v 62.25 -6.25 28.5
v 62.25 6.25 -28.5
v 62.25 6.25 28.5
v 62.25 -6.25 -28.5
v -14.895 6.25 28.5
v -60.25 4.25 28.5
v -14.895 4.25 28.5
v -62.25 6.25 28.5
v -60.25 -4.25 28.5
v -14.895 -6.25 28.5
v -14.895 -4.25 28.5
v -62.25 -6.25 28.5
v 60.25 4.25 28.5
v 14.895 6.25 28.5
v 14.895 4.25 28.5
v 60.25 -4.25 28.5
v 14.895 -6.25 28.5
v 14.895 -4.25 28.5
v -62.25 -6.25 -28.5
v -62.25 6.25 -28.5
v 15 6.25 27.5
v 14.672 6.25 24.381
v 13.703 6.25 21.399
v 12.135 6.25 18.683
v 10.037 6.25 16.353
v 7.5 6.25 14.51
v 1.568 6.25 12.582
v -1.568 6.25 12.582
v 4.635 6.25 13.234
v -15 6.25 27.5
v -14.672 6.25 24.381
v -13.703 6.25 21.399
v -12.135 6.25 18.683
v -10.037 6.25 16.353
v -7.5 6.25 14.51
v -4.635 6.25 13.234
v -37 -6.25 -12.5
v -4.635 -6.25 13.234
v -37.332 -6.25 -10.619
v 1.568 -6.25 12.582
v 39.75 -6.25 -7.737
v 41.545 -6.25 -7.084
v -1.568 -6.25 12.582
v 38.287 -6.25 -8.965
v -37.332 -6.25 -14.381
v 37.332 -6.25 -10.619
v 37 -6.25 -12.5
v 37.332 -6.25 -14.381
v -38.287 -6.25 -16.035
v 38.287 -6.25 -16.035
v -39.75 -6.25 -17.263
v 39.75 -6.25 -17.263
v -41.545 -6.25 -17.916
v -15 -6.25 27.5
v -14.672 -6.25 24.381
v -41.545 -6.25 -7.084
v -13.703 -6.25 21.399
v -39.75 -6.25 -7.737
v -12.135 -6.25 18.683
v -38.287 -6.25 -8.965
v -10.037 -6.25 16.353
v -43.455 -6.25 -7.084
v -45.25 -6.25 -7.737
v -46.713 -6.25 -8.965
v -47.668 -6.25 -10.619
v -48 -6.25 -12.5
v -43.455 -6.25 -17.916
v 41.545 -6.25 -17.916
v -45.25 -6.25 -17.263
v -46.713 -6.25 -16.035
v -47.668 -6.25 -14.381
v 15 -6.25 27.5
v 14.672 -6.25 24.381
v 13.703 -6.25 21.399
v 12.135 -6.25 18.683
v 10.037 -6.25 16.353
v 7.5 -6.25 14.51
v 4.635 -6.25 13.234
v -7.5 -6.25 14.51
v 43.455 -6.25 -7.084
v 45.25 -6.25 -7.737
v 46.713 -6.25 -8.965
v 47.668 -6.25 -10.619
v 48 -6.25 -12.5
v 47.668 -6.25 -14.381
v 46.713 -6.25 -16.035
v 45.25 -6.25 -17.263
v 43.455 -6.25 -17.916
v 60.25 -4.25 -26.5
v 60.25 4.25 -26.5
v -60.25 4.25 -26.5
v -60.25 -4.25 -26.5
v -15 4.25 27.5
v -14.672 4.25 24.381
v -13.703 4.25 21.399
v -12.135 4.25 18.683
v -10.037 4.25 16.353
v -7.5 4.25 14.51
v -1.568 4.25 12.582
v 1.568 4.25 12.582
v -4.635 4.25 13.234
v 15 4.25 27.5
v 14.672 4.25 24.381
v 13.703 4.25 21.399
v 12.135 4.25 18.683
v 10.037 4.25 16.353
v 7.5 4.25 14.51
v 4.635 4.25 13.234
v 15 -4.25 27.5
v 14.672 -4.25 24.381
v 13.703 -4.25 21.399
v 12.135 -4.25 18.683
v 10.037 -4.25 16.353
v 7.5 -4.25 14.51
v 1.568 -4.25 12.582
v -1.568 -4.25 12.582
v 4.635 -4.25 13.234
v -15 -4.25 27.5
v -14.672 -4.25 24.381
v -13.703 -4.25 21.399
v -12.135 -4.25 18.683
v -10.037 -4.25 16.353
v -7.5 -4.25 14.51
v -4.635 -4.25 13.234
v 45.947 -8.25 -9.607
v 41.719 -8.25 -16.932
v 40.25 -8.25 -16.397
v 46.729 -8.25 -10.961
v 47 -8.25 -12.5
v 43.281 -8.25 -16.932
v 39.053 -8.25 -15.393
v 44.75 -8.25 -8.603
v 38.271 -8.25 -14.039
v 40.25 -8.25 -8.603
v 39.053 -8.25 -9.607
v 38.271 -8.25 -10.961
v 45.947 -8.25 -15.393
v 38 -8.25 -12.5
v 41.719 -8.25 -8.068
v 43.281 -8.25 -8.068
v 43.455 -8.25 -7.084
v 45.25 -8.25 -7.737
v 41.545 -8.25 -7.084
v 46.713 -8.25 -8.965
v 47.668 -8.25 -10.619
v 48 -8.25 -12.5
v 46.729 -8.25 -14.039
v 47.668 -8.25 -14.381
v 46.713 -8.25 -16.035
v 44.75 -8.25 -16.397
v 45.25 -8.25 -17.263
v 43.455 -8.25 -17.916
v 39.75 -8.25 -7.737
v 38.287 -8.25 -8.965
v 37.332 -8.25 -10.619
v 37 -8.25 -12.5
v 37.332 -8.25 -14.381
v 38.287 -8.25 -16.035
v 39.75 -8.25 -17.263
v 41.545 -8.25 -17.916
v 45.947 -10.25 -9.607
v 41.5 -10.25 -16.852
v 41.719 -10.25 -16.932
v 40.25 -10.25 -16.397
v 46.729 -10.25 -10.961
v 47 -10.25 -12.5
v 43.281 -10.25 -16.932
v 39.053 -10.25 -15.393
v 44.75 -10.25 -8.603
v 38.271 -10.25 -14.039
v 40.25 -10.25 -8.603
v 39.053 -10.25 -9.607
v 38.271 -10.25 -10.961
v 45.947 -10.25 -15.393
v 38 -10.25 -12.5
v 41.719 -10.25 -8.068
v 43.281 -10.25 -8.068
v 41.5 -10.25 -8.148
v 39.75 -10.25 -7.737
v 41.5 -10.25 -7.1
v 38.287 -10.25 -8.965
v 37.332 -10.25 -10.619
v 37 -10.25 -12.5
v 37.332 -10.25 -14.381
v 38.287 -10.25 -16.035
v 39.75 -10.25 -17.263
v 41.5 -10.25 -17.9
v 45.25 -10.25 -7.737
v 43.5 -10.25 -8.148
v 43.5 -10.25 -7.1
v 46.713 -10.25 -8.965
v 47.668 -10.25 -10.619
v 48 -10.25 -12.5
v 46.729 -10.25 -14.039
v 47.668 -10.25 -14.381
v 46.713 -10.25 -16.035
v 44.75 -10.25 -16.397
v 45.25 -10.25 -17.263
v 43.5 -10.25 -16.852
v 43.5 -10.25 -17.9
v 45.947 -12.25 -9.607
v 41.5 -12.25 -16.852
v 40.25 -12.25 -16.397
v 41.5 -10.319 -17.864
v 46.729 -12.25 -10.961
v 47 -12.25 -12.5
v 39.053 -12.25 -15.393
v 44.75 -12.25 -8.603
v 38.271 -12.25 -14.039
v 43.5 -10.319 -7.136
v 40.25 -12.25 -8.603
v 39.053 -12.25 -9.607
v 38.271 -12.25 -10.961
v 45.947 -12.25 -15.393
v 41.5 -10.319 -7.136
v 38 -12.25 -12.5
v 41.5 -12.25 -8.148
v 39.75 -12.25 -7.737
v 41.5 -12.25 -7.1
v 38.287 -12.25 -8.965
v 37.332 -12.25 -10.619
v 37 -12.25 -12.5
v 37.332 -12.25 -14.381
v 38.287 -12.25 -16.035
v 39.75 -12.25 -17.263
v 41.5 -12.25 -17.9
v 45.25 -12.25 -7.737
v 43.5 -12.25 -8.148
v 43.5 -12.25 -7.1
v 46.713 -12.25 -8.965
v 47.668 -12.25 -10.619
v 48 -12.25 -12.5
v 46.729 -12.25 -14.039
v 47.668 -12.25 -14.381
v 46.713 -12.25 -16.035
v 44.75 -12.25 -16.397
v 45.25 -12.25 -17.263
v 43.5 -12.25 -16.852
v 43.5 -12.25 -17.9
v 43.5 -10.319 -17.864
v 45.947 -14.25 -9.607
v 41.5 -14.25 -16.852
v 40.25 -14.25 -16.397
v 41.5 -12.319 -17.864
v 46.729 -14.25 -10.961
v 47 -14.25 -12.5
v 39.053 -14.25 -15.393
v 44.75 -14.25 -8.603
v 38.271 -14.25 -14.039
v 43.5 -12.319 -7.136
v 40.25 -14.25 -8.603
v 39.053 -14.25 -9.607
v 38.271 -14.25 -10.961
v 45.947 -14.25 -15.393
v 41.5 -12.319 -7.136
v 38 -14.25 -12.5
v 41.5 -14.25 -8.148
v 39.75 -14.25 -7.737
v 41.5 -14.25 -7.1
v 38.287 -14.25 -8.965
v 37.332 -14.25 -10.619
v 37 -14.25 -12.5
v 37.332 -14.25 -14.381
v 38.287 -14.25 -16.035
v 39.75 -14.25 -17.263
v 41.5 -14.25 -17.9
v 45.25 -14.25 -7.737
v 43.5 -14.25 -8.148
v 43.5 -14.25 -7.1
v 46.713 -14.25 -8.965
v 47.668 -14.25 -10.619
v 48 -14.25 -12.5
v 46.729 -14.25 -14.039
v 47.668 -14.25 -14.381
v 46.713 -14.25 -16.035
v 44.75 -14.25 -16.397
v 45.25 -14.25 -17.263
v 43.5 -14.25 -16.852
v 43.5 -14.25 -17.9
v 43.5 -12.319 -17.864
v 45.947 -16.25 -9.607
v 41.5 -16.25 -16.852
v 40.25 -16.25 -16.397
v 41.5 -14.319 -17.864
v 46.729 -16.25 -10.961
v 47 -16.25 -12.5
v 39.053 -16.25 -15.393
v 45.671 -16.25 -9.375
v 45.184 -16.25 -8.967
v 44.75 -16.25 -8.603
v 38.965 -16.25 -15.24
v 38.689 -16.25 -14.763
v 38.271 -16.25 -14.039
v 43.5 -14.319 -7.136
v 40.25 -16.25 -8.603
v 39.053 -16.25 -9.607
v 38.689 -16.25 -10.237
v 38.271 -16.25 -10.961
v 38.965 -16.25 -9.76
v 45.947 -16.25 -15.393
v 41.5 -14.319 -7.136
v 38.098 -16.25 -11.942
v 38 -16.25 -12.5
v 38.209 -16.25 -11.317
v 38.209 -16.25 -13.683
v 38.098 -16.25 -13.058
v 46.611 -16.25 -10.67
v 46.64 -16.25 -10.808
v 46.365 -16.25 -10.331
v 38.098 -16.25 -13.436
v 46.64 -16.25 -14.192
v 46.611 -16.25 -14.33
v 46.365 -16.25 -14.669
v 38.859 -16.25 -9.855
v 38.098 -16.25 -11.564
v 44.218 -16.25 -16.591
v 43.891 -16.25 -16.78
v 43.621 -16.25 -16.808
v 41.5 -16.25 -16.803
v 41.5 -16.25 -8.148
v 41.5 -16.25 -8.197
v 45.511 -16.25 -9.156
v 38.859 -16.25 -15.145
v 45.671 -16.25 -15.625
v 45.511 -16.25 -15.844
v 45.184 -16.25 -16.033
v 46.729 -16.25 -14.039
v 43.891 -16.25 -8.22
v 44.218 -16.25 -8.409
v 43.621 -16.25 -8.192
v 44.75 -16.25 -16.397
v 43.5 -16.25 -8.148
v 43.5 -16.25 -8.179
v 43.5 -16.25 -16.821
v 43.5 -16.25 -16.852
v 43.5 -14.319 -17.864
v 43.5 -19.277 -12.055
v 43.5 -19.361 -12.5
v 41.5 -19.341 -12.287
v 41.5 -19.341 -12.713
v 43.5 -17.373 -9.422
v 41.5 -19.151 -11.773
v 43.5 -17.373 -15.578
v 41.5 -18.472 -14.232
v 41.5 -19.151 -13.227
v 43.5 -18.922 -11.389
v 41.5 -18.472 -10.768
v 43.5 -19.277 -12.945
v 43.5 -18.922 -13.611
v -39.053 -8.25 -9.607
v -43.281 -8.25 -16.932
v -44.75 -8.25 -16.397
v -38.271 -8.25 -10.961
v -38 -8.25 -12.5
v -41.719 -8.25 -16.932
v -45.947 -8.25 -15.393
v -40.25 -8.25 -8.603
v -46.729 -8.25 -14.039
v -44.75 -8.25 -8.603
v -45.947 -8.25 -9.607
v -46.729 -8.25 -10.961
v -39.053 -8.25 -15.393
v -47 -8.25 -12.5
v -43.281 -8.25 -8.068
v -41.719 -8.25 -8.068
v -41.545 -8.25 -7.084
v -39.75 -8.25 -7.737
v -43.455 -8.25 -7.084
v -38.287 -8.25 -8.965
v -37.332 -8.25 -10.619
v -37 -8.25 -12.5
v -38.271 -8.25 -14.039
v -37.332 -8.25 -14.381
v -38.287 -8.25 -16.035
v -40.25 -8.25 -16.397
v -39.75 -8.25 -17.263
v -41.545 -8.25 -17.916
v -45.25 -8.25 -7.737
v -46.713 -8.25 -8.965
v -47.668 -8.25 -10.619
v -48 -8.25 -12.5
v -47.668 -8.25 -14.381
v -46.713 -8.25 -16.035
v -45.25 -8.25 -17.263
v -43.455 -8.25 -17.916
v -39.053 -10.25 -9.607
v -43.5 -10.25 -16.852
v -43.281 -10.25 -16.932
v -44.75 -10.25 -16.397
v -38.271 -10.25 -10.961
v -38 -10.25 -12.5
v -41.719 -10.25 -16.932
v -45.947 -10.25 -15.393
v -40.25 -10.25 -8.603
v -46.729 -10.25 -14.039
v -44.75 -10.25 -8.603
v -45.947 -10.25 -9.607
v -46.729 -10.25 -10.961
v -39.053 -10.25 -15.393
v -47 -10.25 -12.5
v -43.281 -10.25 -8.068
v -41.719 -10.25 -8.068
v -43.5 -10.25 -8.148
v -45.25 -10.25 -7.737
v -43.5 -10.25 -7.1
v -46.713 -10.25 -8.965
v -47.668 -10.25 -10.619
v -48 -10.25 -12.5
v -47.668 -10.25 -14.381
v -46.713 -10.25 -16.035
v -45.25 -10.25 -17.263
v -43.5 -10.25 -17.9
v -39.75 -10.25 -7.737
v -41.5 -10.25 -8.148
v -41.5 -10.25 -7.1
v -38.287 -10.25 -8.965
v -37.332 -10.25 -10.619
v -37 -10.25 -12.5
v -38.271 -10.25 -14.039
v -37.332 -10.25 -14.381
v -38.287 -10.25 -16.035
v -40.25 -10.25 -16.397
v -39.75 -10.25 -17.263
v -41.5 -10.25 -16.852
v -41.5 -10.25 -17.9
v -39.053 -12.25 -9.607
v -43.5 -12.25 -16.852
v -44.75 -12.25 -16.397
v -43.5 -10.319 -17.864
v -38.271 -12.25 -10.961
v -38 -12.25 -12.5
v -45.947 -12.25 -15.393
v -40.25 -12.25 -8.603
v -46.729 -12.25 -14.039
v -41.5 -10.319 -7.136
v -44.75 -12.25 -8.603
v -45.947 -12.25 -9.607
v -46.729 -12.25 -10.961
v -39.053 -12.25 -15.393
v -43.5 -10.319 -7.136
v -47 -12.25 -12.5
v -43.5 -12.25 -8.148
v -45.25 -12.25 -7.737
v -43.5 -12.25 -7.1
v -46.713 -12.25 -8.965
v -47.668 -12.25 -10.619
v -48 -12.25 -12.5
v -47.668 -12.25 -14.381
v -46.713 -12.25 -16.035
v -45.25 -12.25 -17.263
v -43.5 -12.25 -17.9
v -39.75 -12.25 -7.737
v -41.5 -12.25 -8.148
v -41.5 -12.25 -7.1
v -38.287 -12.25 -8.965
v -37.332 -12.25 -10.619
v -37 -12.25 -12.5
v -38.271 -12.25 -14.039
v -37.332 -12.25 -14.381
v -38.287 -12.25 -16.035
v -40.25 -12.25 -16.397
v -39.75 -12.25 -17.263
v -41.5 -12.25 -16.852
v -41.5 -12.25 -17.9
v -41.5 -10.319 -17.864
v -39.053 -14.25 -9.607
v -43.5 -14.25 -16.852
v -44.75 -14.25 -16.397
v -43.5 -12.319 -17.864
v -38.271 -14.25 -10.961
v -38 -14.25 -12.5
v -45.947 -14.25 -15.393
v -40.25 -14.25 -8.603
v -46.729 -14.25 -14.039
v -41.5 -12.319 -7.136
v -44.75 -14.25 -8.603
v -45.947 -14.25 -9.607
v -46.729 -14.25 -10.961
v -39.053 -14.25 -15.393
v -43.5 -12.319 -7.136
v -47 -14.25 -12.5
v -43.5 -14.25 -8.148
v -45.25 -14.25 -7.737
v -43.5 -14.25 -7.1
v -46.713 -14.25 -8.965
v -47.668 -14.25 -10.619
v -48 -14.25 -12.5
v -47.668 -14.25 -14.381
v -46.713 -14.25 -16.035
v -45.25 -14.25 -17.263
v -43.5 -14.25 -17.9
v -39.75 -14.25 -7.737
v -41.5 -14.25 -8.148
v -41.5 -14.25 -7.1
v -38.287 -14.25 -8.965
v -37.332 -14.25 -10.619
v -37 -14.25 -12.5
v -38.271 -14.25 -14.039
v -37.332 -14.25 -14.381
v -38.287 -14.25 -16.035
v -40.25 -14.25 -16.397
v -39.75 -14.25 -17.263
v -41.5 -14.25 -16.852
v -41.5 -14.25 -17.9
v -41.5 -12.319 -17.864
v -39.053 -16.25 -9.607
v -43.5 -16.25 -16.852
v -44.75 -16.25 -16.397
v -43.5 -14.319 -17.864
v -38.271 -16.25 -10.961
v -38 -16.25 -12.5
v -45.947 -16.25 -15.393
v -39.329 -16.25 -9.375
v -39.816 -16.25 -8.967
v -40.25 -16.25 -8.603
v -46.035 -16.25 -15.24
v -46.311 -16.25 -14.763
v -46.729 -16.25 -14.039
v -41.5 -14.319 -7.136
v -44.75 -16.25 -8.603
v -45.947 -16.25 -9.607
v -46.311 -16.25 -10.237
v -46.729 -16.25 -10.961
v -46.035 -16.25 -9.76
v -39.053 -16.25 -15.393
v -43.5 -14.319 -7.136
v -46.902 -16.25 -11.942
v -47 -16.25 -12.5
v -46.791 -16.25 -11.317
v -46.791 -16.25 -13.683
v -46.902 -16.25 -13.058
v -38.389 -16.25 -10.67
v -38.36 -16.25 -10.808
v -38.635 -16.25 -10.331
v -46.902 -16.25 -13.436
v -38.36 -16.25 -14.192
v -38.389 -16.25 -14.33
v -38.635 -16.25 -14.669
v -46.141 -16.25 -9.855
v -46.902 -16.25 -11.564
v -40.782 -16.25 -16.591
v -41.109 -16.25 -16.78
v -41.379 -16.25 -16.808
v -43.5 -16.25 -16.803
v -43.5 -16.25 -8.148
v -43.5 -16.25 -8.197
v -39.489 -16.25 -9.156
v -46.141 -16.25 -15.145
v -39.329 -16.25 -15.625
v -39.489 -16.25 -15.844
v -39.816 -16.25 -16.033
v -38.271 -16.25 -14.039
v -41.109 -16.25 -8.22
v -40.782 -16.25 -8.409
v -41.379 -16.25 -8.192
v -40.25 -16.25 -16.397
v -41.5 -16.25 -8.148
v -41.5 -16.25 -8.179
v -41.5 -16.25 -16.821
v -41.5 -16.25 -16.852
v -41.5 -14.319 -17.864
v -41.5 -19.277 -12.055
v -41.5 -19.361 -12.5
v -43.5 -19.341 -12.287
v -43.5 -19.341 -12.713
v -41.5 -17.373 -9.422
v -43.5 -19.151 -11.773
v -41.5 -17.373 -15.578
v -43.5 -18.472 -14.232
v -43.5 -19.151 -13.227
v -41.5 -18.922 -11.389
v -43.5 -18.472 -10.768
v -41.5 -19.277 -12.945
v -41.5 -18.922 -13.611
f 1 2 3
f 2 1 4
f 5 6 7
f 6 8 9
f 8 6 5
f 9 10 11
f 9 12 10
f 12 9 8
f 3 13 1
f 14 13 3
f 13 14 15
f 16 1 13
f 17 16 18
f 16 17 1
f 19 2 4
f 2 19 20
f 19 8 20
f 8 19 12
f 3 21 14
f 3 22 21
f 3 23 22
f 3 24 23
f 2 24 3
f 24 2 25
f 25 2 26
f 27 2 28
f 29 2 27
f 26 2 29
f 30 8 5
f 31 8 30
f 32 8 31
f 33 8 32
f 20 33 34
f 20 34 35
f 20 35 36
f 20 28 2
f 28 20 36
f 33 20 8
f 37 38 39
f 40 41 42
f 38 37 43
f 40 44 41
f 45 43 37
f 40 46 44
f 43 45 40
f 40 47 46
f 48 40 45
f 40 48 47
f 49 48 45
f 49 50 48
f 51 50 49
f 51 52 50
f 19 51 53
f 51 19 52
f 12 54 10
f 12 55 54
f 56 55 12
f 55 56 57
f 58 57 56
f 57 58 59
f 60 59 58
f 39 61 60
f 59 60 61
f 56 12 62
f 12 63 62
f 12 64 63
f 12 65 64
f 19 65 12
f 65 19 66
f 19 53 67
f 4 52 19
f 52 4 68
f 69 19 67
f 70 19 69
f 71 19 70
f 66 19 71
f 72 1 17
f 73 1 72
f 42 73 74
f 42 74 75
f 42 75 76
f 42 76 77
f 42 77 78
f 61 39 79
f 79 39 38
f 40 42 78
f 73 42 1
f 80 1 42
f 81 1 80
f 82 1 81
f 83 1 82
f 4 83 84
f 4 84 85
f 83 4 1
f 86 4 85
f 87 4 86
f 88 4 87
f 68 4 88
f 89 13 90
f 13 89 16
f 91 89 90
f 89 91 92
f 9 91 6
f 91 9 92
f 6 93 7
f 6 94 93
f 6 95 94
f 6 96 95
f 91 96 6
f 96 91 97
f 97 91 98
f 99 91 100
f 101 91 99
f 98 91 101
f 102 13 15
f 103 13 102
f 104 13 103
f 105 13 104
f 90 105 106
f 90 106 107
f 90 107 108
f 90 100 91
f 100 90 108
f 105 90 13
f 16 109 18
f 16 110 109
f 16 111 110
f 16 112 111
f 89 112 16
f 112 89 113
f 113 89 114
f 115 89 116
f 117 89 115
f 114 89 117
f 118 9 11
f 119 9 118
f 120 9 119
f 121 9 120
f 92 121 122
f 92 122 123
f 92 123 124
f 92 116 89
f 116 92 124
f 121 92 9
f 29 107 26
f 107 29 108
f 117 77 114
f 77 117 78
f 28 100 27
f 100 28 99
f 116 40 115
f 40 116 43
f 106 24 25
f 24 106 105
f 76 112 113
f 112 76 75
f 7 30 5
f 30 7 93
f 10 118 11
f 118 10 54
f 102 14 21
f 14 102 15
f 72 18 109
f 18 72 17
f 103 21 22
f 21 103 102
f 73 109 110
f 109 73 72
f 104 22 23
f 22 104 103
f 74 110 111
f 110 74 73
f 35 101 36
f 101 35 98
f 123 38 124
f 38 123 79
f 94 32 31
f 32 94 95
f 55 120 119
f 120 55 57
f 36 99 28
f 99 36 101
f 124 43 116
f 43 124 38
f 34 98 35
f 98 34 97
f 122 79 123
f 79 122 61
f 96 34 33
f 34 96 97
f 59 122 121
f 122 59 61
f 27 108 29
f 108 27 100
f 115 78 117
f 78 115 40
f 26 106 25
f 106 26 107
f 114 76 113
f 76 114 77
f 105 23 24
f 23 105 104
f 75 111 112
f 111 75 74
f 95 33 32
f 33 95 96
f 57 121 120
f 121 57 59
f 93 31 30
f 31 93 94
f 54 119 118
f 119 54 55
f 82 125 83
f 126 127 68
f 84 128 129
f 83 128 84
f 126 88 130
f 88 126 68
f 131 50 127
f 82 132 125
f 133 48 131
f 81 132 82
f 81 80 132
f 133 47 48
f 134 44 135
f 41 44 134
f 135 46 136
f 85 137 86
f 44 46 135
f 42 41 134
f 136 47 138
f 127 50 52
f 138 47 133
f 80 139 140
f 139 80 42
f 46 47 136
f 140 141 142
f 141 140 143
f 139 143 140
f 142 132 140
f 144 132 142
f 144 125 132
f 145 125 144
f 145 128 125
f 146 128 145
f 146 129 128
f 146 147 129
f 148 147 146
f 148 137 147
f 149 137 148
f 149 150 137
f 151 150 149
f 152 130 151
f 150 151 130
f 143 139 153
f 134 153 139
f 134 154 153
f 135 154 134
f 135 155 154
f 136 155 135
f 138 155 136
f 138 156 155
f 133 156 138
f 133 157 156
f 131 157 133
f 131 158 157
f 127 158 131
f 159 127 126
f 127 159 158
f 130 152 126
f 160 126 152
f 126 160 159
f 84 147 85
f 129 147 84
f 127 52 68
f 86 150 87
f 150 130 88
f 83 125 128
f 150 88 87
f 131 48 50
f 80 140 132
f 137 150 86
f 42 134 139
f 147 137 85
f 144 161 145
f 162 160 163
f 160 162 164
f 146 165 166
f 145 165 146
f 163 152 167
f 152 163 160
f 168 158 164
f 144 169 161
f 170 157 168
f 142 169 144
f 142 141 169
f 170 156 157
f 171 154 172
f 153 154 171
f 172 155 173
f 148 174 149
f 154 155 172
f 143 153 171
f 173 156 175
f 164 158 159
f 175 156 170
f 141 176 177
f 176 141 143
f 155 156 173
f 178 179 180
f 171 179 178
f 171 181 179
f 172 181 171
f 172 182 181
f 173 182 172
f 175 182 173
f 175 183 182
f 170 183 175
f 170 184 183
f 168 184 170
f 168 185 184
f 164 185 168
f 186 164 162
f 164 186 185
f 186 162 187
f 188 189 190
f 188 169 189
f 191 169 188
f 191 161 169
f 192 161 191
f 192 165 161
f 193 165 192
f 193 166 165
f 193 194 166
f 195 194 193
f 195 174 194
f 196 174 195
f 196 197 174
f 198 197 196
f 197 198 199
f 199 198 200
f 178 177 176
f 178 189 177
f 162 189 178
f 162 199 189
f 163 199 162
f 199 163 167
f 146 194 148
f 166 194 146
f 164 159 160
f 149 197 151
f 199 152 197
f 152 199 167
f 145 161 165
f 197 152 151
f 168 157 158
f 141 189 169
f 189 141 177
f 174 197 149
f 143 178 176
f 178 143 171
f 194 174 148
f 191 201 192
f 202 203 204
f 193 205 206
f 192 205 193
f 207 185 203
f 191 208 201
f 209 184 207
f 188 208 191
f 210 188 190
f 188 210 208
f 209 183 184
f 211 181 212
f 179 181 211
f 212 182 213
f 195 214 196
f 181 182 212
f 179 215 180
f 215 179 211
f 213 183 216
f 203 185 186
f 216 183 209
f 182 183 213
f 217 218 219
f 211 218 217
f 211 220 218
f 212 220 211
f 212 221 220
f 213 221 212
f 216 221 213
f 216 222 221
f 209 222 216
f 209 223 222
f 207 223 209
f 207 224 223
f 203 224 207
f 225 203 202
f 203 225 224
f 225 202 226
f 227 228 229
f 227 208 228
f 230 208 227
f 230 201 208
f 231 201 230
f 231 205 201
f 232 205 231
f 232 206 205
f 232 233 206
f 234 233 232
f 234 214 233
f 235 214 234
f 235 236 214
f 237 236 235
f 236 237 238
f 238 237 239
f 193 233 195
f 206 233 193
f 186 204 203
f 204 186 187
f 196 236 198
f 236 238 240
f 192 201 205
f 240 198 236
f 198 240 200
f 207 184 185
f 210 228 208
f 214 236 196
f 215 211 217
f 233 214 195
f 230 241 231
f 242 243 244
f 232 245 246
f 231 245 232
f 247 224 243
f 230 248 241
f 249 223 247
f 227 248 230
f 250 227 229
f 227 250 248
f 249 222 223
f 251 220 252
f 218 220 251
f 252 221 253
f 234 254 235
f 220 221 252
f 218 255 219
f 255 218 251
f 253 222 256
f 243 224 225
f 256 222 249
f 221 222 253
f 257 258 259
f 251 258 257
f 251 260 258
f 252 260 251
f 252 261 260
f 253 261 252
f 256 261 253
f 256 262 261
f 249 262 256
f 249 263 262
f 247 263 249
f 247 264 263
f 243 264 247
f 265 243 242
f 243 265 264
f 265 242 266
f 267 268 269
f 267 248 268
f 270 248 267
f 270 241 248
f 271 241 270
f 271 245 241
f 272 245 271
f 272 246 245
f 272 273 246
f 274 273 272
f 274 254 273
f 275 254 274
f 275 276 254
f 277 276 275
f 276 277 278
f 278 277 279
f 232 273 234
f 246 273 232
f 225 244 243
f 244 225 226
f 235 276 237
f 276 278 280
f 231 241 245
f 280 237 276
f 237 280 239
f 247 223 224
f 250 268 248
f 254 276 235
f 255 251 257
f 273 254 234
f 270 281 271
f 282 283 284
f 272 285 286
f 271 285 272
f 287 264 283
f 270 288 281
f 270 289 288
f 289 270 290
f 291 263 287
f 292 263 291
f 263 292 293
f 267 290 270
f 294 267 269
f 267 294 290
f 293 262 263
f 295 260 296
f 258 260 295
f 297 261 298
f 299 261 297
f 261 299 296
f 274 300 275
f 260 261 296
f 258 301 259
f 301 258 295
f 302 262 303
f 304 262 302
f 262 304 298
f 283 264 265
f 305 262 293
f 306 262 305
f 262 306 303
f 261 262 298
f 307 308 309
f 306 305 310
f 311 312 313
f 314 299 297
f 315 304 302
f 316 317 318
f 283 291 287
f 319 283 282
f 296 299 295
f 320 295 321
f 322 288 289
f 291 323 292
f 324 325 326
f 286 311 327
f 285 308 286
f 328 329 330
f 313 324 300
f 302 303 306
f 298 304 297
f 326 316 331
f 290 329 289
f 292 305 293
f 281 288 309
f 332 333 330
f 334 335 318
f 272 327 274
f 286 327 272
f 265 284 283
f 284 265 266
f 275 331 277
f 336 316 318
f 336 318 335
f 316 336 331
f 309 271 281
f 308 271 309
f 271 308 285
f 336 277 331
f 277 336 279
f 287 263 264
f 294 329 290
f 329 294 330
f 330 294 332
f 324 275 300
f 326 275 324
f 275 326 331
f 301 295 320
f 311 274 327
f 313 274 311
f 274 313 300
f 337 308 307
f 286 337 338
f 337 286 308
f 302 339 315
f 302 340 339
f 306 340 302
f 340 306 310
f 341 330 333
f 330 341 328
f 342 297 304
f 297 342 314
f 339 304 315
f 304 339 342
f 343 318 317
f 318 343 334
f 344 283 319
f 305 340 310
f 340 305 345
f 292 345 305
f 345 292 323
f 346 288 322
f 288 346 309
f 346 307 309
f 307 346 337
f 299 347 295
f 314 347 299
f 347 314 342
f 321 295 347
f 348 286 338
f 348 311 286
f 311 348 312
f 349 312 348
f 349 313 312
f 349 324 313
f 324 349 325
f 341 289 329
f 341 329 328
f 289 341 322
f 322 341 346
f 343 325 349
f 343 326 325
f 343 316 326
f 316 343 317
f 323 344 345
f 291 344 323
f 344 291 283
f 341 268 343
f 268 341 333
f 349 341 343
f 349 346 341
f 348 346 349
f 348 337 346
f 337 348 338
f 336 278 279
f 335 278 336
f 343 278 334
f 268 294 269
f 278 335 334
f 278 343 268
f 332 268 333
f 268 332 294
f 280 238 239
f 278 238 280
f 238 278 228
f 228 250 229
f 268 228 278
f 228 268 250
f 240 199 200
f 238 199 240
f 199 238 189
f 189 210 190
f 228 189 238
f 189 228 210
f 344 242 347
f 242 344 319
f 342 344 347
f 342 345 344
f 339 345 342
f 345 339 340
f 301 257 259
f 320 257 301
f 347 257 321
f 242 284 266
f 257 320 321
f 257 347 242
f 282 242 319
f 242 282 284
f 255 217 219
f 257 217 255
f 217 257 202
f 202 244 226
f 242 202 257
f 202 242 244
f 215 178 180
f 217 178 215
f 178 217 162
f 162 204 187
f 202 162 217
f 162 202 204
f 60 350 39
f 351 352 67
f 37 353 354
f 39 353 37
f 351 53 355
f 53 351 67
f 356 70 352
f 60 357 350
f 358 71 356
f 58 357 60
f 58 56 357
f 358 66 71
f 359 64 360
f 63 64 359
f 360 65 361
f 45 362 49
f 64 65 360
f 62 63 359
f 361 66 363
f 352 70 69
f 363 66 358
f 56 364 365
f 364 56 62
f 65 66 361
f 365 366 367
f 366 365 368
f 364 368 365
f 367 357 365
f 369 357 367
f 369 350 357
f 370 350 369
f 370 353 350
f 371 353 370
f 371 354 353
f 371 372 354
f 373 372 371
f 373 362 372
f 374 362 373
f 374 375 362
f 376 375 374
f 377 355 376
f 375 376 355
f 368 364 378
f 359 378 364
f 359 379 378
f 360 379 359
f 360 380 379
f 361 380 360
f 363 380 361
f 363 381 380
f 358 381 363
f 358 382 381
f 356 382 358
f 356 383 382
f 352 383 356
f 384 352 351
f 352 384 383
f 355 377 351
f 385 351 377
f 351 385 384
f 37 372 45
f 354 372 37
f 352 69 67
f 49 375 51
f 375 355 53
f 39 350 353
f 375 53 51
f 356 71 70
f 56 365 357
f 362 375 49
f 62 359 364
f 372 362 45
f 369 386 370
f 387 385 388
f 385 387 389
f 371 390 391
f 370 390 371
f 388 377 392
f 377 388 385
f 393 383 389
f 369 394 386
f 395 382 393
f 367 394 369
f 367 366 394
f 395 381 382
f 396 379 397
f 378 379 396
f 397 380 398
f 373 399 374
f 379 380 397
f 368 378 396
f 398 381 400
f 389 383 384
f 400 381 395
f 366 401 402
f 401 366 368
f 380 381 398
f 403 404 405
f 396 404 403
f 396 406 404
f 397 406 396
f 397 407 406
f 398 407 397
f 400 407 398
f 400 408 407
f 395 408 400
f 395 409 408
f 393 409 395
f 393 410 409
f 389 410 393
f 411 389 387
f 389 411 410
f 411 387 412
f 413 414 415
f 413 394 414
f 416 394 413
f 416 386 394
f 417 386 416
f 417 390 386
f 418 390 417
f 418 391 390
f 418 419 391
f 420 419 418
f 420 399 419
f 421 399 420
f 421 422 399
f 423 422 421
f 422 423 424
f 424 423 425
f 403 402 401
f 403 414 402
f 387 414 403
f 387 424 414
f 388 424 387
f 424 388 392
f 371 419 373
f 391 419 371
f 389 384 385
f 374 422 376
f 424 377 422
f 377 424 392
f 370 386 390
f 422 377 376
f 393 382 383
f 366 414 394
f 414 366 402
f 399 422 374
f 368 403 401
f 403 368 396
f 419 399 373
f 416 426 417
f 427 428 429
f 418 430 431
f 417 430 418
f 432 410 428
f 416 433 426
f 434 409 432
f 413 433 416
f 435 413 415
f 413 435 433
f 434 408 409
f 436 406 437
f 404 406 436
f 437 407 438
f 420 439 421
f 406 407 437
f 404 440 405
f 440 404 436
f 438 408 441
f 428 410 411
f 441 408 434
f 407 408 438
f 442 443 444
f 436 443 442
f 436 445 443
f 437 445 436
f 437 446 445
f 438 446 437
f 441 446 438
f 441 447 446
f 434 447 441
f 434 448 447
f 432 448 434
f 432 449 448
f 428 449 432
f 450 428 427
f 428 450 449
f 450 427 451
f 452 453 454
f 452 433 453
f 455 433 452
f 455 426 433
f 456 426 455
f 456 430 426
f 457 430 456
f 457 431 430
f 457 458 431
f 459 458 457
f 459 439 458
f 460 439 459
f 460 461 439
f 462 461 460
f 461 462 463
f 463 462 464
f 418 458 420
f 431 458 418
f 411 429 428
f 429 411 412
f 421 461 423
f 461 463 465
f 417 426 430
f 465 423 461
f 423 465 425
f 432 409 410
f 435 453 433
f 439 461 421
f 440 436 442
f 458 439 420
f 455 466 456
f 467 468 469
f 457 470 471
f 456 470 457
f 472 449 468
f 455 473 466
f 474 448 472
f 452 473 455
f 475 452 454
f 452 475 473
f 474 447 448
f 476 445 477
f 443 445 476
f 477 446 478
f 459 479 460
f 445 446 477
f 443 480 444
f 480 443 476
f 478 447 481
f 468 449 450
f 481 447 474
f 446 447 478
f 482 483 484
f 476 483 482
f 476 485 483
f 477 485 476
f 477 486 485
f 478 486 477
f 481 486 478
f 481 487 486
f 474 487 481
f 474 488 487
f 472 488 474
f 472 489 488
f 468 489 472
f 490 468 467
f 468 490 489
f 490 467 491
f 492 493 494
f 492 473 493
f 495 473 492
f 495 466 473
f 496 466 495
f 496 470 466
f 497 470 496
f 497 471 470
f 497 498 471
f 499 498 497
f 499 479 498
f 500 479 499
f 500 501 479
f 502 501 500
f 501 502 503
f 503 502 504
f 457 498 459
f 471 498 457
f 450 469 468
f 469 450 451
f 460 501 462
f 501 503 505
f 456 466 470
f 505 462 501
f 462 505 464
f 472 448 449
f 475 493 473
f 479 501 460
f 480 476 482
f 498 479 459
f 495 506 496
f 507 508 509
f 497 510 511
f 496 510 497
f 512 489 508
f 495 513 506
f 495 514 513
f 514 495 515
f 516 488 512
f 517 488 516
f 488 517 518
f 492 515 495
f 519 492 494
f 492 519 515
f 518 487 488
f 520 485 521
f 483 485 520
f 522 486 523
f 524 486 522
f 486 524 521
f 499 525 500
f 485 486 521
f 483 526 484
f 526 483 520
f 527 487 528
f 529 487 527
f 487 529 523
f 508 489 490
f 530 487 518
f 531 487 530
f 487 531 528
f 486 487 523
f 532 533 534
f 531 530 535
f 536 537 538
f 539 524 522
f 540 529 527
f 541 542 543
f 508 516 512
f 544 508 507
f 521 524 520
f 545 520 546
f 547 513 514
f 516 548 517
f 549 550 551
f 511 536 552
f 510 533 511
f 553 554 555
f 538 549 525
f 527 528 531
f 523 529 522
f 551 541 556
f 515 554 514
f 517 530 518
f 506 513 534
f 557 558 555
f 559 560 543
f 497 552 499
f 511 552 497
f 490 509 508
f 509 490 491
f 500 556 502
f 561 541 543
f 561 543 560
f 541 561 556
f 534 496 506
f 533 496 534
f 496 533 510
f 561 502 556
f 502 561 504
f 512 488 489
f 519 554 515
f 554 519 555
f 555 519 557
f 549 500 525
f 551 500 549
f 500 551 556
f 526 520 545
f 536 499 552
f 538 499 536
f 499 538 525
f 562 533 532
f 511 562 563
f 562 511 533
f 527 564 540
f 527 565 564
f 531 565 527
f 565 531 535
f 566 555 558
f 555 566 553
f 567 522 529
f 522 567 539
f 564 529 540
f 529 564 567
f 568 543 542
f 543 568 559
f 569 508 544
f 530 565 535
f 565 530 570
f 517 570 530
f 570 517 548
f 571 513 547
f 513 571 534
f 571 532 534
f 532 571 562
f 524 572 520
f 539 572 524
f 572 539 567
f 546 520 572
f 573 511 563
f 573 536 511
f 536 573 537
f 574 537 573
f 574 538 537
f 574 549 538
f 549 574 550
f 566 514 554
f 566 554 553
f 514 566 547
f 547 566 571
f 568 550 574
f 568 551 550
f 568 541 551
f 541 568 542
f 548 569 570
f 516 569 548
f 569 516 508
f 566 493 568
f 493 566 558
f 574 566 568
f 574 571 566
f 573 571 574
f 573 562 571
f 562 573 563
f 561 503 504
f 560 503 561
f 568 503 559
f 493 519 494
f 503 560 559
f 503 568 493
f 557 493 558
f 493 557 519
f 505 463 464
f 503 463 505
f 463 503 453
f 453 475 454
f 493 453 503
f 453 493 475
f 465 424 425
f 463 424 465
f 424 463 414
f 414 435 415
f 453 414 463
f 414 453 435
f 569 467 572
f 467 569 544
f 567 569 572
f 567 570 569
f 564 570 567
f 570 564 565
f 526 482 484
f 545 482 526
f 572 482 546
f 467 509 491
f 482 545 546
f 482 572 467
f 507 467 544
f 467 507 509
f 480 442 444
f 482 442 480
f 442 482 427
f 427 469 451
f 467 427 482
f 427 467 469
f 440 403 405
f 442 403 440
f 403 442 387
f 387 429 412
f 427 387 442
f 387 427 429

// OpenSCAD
// Bed frame support
// plbarrio

// table dimensions
tableWidth  = 120.5;
tableHeight = 8.5;
tableDeep = 55;

// noch radius
notchRadius = 30;

// pin dimensions
pinDiam  = 9;
pinDiam2 = 11;
pinHeight = 2;
pinCount  = 5;
pinGape   =2;
pinIntercenter = 85;
pinCenter = 15;

// Wall thickness
wallThick=2;

// Box
difference (){
    cube ( [tableWidth + 2* wallThick, tableHeight +  2* wallThick, tableDeep + wallThick], center =true);
    translate ([0,0,wallThick])
    cube ( [tableWidth , tableHeight , tableDeep + wallThick ], center =true);
    translate ([0,0,tableDeep /2 ])
        rotate ([90,0,0])
            cylinder (d=notchRadius, h= 2*tableHeight, center = true);
}


//pins
translate([pinIntercenter/2,-(tableHeight/2+ wallThick),-tableDeep/2+pinCenter])
    rotate ([90,0,0])
        pin();
translate([-pinIntercenter/2,-(tableHeight/2+ wallThick),-tableDeep/2+pinCenter])
    rotate ([90,0,0])
        pin();

// modile for pins
module pin(){
    difference () {
        union () {
            for (i = [0:pinCount-1]){
                translate([0, 0, i*pinHeight])
                    cylinder (d1 = pinDiam2, d2 =pinDiam, h=pinHeight);

               
            }
            translate([0, 0, pinCount * pinHeight])
            cylinder (d1 = pinDiam, d2 =0, h=pinHeight*2);
            
        }
        translate([0, 0, pinCount * pinHeight])
            cube ([pinGape,pinDiam2+1,pinDiam2+1], center = true);
    }
}
